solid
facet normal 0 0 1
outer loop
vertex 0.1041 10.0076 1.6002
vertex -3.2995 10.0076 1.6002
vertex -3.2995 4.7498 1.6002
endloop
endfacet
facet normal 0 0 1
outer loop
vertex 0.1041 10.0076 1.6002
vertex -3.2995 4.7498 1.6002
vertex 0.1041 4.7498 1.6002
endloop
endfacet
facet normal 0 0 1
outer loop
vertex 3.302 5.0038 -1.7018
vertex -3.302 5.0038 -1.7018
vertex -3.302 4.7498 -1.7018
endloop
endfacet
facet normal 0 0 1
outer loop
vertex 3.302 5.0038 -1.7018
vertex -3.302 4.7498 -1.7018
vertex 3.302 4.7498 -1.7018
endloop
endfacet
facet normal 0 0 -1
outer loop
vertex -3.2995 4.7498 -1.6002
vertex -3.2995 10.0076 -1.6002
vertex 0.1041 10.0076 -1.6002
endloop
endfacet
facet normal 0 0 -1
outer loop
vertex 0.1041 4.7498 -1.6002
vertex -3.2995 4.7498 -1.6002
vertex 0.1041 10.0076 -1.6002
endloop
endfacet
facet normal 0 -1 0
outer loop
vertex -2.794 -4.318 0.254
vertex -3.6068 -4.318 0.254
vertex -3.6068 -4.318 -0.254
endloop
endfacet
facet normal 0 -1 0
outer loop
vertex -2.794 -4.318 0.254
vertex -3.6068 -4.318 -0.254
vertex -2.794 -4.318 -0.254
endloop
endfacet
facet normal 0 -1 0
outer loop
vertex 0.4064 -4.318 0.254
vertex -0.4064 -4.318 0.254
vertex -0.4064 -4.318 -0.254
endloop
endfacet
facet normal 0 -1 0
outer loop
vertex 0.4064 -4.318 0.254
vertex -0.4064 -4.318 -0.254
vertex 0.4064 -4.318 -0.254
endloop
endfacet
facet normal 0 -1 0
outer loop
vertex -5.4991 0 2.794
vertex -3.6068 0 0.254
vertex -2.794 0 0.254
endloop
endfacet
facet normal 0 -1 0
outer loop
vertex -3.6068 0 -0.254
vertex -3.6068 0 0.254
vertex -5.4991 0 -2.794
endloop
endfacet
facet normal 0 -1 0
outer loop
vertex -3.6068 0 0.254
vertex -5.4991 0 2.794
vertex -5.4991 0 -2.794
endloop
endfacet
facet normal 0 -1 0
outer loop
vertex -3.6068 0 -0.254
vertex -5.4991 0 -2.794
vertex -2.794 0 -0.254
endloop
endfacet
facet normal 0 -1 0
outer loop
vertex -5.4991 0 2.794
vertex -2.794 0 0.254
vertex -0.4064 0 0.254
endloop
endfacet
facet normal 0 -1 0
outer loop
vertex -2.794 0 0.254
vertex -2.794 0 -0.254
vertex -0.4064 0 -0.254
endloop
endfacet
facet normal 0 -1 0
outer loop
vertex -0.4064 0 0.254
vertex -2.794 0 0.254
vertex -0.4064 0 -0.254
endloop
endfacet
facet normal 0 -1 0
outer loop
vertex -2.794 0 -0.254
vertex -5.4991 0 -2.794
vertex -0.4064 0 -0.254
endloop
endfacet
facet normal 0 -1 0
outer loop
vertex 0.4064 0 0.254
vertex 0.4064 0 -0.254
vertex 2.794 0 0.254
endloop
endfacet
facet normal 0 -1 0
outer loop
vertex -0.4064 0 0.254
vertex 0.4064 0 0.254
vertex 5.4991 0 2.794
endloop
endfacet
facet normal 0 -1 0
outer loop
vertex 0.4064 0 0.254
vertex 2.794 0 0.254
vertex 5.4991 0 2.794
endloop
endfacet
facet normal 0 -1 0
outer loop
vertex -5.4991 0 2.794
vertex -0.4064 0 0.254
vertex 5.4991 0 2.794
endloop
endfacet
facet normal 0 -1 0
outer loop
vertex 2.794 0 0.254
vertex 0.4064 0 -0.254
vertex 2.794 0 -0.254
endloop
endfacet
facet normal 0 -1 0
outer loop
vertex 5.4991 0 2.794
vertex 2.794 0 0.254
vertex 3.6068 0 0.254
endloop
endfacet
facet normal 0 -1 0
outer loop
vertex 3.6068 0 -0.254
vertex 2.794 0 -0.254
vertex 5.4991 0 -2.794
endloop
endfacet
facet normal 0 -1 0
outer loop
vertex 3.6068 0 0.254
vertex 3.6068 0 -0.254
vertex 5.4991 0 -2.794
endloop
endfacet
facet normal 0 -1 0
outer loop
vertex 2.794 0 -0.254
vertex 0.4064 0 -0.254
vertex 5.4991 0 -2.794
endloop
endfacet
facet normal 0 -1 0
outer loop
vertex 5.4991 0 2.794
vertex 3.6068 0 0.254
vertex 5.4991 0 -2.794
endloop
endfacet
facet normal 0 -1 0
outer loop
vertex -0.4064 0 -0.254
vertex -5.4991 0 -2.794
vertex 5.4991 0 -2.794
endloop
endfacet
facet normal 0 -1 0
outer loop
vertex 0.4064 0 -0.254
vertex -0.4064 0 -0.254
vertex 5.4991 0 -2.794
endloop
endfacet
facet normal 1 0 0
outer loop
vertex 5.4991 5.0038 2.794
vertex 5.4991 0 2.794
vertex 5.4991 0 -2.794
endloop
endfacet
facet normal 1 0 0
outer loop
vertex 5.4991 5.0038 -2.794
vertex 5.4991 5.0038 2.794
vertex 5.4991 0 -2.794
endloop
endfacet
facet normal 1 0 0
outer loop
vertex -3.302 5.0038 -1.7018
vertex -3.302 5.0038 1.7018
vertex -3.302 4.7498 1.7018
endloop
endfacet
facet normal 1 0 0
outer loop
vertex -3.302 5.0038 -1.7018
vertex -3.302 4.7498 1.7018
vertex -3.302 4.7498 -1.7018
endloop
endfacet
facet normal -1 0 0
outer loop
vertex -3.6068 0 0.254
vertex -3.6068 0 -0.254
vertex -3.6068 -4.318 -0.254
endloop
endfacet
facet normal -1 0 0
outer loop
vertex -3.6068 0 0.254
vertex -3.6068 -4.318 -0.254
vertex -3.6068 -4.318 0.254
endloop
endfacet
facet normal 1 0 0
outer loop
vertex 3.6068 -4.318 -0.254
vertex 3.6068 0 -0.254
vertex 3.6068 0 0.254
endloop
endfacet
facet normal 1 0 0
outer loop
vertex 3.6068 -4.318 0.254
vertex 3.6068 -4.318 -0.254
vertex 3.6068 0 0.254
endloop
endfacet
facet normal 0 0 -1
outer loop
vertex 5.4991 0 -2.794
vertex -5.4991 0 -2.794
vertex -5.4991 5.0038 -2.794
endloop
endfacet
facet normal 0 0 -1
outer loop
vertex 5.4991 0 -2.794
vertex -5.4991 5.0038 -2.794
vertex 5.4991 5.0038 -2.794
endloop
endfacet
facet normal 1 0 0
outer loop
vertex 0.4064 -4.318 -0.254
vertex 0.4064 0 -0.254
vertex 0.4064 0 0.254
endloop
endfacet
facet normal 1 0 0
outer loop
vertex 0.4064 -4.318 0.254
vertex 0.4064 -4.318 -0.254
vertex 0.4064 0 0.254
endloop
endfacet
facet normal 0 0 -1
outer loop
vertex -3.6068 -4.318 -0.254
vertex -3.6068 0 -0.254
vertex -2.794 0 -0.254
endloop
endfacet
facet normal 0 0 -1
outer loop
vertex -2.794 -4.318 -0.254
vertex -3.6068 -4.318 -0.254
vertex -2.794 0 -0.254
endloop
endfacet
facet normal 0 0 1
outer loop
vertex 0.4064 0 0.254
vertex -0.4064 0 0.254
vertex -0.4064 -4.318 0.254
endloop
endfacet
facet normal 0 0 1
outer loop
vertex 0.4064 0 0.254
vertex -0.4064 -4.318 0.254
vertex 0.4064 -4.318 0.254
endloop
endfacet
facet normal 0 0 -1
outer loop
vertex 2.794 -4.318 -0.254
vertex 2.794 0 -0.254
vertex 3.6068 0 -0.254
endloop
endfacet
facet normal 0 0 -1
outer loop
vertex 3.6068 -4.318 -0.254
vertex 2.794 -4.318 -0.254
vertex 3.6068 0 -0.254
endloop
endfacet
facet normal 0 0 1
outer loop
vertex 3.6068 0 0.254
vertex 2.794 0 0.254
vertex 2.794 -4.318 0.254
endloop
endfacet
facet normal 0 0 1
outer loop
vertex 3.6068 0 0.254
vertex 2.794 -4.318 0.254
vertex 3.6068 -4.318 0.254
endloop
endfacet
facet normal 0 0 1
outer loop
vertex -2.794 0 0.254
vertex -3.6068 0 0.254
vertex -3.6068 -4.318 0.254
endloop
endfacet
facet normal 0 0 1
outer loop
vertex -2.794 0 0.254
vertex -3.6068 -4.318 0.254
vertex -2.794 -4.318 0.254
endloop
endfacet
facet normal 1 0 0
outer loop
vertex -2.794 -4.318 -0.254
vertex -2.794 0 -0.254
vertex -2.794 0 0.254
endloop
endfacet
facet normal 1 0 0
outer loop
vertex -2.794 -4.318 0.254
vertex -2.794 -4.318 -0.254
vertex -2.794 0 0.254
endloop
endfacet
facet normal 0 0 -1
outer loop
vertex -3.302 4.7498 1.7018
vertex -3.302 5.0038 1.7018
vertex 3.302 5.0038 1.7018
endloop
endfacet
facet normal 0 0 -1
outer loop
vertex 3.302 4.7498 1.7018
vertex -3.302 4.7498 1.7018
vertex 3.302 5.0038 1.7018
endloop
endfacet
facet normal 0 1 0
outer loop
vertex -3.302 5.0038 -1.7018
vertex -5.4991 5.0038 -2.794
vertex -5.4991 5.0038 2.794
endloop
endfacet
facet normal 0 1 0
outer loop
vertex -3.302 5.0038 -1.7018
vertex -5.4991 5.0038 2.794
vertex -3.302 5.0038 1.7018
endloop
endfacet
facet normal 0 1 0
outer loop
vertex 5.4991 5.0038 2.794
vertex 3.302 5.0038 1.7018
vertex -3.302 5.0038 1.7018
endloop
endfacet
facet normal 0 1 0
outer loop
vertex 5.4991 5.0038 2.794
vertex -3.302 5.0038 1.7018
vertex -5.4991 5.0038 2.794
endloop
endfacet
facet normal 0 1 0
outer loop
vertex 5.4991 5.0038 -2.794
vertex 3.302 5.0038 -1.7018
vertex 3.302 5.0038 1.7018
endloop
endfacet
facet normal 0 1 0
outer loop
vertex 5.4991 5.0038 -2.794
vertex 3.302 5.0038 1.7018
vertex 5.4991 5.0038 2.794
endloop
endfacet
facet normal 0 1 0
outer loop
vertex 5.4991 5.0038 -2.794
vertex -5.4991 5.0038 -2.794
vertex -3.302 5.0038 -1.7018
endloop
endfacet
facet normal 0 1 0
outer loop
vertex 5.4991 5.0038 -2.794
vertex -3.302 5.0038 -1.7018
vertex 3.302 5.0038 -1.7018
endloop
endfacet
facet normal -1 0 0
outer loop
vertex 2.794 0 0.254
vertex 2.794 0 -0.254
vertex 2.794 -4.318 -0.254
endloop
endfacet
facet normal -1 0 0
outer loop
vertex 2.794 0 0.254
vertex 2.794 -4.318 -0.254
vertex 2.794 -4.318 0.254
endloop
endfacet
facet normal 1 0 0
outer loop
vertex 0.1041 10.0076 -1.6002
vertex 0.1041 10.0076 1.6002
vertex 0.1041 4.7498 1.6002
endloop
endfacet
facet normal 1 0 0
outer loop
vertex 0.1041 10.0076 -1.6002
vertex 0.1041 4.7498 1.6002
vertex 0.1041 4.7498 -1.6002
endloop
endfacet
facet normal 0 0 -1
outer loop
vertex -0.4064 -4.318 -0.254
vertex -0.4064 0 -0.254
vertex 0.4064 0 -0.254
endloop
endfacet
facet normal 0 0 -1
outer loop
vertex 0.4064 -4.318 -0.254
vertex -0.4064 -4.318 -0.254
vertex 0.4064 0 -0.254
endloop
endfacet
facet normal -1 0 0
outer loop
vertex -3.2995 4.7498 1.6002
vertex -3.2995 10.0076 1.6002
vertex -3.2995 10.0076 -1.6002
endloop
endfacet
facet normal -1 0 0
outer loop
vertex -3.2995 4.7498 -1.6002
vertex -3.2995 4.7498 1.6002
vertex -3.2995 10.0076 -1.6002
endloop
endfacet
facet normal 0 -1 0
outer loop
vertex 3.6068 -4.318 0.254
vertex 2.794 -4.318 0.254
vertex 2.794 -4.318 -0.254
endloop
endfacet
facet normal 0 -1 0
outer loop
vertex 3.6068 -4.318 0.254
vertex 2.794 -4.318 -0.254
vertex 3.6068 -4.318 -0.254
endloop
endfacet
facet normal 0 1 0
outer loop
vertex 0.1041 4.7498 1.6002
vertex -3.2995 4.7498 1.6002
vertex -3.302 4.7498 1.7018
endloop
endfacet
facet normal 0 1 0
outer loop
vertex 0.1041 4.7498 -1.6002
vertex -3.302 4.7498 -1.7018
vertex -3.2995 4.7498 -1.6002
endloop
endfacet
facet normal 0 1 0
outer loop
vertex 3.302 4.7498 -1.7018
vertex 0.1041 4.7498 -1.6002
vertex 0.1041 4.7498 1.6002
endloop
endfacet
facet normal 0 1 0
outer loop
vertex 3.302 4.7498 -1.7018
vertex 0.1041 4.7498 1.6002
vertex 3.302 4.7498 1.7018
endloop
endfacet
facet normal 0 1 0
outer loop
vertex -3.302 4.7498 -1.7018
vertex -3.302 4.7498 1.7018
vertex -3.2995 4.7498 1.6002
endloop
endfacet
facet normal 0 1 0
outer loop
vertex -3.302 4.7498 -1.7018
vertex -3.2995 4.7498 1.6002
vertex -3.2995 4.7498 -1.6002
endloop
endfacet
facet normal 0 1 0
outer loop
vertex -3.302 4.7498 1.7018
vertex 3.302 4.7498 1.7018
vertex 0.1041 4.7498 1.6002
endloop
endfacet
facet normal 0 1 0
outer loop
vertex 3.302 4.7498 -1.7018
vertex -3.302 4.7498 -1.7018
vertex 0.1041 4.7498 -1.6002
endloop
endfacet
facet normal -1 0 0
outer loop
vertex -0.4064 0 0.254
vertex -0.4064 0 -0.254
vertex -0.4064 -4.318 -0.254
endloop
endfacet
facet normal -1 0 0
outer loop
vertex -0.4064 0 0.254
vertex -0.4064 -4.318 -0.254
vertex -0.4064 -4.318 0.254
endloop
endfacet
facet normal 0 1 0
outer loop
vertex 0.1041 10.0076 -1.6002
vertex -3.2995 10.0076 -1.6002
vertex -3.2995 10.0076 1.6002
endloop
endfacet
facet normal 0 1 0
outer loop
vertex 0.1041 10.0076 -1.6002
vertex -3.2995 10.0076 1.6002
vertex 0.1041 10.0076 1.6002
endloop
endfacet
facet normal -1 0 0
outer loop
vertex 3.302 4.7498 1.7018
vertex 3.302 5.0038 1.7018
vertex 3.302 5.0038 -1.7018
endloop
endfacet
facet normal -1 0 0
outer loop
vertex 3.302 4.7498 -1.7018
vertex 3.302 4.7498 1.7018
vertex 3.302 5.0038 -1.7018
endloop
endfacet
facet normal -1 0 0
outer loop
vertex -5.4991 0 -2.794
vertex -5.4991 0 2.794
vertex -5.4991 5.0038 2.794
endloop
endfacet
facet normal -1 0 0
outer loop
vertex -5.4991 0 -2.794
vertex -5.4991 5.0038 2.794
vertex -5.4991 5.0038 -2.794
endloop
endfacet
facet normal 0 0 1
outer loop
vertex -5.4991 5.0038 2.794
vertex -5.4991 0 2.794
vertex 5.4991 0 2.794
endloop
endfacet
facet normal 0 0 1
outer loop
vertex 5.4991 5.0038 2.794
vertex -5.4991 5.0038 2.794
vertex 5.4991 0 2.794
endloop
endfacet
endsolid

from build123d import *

# Parameters (mm, degrees)
SKETCH1_W           = 10.9982
SKETCH1_H           = 5.588
BOSS_EXTRUDE1_DEPTH = 5.0038
SKETCH2_W           = 6.604
SKETCH2_H           = 3.4036
CUT_EXTRUDE1_DEPTH  = 0.254
SKETCH3_W           = 3.4036
SKETCH3_H           = 3.2004
BOSS_EXTRUDE2_DEPTH = 5.2578
SKETCH4_W           = 0.8128
SKETCH4_H           = 0.508
BOSS_EXTRUDE3_DEPTH = 4.318
LPATTERN1_COUNT     = 2
LPATTERN1_PITCH     = 3.2004
LPATTERN1_COL_COUNT = 2
LPATTERN1_COL_PITCH = 3.2004


with BuildPart() as part:
    # Sketch1 → Boss-Extrude1 (new body)
    with BuildSketch(Plane(origin=(0, 0, 0), x_dir=(1, 0, 0), z_dir=(0, 1, 0))):
        Rectangle(SKETCH1_W, SKETCH1_H)
    extrude(amount=BOSS_EXTRUDE1_DEPTH)

    # Sketch2 → Cut-Extrude1 (cut)
    with BuildSketch(Plane(origin=(0, 5.0038, 0), x_dir=(1, 0, 0), z_dir=(0, 1, 0))):
        Rectangle(SKETCH2_W, SKETCH2_H)
    extrude(amount=-CUT_EXTRUDE1_DEPTH, mode=Mode.SUBTRACT)

    # Sketch3 → Boss-Extrude2 (add)
    with BuildSketch(Plane(origin=(0, 4.7498, 0), x_dir=(1, 0, 0), z_dir=(0, 1, 0))):
        with Locations((-1.59766, 0)):
            Rectangle(SKETCH3_W, SKETCH3_H)
    extrude(amount=BOSS_EXTRUDE2_DEPTH)

    # Sketch4 → Boss-Extrude3 (add)
    with BuildSketch(Plane.XZ):
        Rectangle(SKETCH4_W, SKETCH4_H)
    boss_extrude3 = extrude(amount=BOSS_EXTRUDE3_DEPTH)

    # LPattern1: Boss-Extrude3 ×2
    with Locations(*[(i * LPATTERN1_PITCH, 0, 0) for i in range(1, LPATTERN1_COUNT)]):
        add(boss_extrude3)

    # LPattern1 col: Boss-Extrude3 ×2
    with Locations(*[(-i * LPATTERN1_COL_PITCH, 0, 0) for i in range(1, LPATTERN1_COL_COUNT)]):
        add(boss_extrude3)


solid = part.part
